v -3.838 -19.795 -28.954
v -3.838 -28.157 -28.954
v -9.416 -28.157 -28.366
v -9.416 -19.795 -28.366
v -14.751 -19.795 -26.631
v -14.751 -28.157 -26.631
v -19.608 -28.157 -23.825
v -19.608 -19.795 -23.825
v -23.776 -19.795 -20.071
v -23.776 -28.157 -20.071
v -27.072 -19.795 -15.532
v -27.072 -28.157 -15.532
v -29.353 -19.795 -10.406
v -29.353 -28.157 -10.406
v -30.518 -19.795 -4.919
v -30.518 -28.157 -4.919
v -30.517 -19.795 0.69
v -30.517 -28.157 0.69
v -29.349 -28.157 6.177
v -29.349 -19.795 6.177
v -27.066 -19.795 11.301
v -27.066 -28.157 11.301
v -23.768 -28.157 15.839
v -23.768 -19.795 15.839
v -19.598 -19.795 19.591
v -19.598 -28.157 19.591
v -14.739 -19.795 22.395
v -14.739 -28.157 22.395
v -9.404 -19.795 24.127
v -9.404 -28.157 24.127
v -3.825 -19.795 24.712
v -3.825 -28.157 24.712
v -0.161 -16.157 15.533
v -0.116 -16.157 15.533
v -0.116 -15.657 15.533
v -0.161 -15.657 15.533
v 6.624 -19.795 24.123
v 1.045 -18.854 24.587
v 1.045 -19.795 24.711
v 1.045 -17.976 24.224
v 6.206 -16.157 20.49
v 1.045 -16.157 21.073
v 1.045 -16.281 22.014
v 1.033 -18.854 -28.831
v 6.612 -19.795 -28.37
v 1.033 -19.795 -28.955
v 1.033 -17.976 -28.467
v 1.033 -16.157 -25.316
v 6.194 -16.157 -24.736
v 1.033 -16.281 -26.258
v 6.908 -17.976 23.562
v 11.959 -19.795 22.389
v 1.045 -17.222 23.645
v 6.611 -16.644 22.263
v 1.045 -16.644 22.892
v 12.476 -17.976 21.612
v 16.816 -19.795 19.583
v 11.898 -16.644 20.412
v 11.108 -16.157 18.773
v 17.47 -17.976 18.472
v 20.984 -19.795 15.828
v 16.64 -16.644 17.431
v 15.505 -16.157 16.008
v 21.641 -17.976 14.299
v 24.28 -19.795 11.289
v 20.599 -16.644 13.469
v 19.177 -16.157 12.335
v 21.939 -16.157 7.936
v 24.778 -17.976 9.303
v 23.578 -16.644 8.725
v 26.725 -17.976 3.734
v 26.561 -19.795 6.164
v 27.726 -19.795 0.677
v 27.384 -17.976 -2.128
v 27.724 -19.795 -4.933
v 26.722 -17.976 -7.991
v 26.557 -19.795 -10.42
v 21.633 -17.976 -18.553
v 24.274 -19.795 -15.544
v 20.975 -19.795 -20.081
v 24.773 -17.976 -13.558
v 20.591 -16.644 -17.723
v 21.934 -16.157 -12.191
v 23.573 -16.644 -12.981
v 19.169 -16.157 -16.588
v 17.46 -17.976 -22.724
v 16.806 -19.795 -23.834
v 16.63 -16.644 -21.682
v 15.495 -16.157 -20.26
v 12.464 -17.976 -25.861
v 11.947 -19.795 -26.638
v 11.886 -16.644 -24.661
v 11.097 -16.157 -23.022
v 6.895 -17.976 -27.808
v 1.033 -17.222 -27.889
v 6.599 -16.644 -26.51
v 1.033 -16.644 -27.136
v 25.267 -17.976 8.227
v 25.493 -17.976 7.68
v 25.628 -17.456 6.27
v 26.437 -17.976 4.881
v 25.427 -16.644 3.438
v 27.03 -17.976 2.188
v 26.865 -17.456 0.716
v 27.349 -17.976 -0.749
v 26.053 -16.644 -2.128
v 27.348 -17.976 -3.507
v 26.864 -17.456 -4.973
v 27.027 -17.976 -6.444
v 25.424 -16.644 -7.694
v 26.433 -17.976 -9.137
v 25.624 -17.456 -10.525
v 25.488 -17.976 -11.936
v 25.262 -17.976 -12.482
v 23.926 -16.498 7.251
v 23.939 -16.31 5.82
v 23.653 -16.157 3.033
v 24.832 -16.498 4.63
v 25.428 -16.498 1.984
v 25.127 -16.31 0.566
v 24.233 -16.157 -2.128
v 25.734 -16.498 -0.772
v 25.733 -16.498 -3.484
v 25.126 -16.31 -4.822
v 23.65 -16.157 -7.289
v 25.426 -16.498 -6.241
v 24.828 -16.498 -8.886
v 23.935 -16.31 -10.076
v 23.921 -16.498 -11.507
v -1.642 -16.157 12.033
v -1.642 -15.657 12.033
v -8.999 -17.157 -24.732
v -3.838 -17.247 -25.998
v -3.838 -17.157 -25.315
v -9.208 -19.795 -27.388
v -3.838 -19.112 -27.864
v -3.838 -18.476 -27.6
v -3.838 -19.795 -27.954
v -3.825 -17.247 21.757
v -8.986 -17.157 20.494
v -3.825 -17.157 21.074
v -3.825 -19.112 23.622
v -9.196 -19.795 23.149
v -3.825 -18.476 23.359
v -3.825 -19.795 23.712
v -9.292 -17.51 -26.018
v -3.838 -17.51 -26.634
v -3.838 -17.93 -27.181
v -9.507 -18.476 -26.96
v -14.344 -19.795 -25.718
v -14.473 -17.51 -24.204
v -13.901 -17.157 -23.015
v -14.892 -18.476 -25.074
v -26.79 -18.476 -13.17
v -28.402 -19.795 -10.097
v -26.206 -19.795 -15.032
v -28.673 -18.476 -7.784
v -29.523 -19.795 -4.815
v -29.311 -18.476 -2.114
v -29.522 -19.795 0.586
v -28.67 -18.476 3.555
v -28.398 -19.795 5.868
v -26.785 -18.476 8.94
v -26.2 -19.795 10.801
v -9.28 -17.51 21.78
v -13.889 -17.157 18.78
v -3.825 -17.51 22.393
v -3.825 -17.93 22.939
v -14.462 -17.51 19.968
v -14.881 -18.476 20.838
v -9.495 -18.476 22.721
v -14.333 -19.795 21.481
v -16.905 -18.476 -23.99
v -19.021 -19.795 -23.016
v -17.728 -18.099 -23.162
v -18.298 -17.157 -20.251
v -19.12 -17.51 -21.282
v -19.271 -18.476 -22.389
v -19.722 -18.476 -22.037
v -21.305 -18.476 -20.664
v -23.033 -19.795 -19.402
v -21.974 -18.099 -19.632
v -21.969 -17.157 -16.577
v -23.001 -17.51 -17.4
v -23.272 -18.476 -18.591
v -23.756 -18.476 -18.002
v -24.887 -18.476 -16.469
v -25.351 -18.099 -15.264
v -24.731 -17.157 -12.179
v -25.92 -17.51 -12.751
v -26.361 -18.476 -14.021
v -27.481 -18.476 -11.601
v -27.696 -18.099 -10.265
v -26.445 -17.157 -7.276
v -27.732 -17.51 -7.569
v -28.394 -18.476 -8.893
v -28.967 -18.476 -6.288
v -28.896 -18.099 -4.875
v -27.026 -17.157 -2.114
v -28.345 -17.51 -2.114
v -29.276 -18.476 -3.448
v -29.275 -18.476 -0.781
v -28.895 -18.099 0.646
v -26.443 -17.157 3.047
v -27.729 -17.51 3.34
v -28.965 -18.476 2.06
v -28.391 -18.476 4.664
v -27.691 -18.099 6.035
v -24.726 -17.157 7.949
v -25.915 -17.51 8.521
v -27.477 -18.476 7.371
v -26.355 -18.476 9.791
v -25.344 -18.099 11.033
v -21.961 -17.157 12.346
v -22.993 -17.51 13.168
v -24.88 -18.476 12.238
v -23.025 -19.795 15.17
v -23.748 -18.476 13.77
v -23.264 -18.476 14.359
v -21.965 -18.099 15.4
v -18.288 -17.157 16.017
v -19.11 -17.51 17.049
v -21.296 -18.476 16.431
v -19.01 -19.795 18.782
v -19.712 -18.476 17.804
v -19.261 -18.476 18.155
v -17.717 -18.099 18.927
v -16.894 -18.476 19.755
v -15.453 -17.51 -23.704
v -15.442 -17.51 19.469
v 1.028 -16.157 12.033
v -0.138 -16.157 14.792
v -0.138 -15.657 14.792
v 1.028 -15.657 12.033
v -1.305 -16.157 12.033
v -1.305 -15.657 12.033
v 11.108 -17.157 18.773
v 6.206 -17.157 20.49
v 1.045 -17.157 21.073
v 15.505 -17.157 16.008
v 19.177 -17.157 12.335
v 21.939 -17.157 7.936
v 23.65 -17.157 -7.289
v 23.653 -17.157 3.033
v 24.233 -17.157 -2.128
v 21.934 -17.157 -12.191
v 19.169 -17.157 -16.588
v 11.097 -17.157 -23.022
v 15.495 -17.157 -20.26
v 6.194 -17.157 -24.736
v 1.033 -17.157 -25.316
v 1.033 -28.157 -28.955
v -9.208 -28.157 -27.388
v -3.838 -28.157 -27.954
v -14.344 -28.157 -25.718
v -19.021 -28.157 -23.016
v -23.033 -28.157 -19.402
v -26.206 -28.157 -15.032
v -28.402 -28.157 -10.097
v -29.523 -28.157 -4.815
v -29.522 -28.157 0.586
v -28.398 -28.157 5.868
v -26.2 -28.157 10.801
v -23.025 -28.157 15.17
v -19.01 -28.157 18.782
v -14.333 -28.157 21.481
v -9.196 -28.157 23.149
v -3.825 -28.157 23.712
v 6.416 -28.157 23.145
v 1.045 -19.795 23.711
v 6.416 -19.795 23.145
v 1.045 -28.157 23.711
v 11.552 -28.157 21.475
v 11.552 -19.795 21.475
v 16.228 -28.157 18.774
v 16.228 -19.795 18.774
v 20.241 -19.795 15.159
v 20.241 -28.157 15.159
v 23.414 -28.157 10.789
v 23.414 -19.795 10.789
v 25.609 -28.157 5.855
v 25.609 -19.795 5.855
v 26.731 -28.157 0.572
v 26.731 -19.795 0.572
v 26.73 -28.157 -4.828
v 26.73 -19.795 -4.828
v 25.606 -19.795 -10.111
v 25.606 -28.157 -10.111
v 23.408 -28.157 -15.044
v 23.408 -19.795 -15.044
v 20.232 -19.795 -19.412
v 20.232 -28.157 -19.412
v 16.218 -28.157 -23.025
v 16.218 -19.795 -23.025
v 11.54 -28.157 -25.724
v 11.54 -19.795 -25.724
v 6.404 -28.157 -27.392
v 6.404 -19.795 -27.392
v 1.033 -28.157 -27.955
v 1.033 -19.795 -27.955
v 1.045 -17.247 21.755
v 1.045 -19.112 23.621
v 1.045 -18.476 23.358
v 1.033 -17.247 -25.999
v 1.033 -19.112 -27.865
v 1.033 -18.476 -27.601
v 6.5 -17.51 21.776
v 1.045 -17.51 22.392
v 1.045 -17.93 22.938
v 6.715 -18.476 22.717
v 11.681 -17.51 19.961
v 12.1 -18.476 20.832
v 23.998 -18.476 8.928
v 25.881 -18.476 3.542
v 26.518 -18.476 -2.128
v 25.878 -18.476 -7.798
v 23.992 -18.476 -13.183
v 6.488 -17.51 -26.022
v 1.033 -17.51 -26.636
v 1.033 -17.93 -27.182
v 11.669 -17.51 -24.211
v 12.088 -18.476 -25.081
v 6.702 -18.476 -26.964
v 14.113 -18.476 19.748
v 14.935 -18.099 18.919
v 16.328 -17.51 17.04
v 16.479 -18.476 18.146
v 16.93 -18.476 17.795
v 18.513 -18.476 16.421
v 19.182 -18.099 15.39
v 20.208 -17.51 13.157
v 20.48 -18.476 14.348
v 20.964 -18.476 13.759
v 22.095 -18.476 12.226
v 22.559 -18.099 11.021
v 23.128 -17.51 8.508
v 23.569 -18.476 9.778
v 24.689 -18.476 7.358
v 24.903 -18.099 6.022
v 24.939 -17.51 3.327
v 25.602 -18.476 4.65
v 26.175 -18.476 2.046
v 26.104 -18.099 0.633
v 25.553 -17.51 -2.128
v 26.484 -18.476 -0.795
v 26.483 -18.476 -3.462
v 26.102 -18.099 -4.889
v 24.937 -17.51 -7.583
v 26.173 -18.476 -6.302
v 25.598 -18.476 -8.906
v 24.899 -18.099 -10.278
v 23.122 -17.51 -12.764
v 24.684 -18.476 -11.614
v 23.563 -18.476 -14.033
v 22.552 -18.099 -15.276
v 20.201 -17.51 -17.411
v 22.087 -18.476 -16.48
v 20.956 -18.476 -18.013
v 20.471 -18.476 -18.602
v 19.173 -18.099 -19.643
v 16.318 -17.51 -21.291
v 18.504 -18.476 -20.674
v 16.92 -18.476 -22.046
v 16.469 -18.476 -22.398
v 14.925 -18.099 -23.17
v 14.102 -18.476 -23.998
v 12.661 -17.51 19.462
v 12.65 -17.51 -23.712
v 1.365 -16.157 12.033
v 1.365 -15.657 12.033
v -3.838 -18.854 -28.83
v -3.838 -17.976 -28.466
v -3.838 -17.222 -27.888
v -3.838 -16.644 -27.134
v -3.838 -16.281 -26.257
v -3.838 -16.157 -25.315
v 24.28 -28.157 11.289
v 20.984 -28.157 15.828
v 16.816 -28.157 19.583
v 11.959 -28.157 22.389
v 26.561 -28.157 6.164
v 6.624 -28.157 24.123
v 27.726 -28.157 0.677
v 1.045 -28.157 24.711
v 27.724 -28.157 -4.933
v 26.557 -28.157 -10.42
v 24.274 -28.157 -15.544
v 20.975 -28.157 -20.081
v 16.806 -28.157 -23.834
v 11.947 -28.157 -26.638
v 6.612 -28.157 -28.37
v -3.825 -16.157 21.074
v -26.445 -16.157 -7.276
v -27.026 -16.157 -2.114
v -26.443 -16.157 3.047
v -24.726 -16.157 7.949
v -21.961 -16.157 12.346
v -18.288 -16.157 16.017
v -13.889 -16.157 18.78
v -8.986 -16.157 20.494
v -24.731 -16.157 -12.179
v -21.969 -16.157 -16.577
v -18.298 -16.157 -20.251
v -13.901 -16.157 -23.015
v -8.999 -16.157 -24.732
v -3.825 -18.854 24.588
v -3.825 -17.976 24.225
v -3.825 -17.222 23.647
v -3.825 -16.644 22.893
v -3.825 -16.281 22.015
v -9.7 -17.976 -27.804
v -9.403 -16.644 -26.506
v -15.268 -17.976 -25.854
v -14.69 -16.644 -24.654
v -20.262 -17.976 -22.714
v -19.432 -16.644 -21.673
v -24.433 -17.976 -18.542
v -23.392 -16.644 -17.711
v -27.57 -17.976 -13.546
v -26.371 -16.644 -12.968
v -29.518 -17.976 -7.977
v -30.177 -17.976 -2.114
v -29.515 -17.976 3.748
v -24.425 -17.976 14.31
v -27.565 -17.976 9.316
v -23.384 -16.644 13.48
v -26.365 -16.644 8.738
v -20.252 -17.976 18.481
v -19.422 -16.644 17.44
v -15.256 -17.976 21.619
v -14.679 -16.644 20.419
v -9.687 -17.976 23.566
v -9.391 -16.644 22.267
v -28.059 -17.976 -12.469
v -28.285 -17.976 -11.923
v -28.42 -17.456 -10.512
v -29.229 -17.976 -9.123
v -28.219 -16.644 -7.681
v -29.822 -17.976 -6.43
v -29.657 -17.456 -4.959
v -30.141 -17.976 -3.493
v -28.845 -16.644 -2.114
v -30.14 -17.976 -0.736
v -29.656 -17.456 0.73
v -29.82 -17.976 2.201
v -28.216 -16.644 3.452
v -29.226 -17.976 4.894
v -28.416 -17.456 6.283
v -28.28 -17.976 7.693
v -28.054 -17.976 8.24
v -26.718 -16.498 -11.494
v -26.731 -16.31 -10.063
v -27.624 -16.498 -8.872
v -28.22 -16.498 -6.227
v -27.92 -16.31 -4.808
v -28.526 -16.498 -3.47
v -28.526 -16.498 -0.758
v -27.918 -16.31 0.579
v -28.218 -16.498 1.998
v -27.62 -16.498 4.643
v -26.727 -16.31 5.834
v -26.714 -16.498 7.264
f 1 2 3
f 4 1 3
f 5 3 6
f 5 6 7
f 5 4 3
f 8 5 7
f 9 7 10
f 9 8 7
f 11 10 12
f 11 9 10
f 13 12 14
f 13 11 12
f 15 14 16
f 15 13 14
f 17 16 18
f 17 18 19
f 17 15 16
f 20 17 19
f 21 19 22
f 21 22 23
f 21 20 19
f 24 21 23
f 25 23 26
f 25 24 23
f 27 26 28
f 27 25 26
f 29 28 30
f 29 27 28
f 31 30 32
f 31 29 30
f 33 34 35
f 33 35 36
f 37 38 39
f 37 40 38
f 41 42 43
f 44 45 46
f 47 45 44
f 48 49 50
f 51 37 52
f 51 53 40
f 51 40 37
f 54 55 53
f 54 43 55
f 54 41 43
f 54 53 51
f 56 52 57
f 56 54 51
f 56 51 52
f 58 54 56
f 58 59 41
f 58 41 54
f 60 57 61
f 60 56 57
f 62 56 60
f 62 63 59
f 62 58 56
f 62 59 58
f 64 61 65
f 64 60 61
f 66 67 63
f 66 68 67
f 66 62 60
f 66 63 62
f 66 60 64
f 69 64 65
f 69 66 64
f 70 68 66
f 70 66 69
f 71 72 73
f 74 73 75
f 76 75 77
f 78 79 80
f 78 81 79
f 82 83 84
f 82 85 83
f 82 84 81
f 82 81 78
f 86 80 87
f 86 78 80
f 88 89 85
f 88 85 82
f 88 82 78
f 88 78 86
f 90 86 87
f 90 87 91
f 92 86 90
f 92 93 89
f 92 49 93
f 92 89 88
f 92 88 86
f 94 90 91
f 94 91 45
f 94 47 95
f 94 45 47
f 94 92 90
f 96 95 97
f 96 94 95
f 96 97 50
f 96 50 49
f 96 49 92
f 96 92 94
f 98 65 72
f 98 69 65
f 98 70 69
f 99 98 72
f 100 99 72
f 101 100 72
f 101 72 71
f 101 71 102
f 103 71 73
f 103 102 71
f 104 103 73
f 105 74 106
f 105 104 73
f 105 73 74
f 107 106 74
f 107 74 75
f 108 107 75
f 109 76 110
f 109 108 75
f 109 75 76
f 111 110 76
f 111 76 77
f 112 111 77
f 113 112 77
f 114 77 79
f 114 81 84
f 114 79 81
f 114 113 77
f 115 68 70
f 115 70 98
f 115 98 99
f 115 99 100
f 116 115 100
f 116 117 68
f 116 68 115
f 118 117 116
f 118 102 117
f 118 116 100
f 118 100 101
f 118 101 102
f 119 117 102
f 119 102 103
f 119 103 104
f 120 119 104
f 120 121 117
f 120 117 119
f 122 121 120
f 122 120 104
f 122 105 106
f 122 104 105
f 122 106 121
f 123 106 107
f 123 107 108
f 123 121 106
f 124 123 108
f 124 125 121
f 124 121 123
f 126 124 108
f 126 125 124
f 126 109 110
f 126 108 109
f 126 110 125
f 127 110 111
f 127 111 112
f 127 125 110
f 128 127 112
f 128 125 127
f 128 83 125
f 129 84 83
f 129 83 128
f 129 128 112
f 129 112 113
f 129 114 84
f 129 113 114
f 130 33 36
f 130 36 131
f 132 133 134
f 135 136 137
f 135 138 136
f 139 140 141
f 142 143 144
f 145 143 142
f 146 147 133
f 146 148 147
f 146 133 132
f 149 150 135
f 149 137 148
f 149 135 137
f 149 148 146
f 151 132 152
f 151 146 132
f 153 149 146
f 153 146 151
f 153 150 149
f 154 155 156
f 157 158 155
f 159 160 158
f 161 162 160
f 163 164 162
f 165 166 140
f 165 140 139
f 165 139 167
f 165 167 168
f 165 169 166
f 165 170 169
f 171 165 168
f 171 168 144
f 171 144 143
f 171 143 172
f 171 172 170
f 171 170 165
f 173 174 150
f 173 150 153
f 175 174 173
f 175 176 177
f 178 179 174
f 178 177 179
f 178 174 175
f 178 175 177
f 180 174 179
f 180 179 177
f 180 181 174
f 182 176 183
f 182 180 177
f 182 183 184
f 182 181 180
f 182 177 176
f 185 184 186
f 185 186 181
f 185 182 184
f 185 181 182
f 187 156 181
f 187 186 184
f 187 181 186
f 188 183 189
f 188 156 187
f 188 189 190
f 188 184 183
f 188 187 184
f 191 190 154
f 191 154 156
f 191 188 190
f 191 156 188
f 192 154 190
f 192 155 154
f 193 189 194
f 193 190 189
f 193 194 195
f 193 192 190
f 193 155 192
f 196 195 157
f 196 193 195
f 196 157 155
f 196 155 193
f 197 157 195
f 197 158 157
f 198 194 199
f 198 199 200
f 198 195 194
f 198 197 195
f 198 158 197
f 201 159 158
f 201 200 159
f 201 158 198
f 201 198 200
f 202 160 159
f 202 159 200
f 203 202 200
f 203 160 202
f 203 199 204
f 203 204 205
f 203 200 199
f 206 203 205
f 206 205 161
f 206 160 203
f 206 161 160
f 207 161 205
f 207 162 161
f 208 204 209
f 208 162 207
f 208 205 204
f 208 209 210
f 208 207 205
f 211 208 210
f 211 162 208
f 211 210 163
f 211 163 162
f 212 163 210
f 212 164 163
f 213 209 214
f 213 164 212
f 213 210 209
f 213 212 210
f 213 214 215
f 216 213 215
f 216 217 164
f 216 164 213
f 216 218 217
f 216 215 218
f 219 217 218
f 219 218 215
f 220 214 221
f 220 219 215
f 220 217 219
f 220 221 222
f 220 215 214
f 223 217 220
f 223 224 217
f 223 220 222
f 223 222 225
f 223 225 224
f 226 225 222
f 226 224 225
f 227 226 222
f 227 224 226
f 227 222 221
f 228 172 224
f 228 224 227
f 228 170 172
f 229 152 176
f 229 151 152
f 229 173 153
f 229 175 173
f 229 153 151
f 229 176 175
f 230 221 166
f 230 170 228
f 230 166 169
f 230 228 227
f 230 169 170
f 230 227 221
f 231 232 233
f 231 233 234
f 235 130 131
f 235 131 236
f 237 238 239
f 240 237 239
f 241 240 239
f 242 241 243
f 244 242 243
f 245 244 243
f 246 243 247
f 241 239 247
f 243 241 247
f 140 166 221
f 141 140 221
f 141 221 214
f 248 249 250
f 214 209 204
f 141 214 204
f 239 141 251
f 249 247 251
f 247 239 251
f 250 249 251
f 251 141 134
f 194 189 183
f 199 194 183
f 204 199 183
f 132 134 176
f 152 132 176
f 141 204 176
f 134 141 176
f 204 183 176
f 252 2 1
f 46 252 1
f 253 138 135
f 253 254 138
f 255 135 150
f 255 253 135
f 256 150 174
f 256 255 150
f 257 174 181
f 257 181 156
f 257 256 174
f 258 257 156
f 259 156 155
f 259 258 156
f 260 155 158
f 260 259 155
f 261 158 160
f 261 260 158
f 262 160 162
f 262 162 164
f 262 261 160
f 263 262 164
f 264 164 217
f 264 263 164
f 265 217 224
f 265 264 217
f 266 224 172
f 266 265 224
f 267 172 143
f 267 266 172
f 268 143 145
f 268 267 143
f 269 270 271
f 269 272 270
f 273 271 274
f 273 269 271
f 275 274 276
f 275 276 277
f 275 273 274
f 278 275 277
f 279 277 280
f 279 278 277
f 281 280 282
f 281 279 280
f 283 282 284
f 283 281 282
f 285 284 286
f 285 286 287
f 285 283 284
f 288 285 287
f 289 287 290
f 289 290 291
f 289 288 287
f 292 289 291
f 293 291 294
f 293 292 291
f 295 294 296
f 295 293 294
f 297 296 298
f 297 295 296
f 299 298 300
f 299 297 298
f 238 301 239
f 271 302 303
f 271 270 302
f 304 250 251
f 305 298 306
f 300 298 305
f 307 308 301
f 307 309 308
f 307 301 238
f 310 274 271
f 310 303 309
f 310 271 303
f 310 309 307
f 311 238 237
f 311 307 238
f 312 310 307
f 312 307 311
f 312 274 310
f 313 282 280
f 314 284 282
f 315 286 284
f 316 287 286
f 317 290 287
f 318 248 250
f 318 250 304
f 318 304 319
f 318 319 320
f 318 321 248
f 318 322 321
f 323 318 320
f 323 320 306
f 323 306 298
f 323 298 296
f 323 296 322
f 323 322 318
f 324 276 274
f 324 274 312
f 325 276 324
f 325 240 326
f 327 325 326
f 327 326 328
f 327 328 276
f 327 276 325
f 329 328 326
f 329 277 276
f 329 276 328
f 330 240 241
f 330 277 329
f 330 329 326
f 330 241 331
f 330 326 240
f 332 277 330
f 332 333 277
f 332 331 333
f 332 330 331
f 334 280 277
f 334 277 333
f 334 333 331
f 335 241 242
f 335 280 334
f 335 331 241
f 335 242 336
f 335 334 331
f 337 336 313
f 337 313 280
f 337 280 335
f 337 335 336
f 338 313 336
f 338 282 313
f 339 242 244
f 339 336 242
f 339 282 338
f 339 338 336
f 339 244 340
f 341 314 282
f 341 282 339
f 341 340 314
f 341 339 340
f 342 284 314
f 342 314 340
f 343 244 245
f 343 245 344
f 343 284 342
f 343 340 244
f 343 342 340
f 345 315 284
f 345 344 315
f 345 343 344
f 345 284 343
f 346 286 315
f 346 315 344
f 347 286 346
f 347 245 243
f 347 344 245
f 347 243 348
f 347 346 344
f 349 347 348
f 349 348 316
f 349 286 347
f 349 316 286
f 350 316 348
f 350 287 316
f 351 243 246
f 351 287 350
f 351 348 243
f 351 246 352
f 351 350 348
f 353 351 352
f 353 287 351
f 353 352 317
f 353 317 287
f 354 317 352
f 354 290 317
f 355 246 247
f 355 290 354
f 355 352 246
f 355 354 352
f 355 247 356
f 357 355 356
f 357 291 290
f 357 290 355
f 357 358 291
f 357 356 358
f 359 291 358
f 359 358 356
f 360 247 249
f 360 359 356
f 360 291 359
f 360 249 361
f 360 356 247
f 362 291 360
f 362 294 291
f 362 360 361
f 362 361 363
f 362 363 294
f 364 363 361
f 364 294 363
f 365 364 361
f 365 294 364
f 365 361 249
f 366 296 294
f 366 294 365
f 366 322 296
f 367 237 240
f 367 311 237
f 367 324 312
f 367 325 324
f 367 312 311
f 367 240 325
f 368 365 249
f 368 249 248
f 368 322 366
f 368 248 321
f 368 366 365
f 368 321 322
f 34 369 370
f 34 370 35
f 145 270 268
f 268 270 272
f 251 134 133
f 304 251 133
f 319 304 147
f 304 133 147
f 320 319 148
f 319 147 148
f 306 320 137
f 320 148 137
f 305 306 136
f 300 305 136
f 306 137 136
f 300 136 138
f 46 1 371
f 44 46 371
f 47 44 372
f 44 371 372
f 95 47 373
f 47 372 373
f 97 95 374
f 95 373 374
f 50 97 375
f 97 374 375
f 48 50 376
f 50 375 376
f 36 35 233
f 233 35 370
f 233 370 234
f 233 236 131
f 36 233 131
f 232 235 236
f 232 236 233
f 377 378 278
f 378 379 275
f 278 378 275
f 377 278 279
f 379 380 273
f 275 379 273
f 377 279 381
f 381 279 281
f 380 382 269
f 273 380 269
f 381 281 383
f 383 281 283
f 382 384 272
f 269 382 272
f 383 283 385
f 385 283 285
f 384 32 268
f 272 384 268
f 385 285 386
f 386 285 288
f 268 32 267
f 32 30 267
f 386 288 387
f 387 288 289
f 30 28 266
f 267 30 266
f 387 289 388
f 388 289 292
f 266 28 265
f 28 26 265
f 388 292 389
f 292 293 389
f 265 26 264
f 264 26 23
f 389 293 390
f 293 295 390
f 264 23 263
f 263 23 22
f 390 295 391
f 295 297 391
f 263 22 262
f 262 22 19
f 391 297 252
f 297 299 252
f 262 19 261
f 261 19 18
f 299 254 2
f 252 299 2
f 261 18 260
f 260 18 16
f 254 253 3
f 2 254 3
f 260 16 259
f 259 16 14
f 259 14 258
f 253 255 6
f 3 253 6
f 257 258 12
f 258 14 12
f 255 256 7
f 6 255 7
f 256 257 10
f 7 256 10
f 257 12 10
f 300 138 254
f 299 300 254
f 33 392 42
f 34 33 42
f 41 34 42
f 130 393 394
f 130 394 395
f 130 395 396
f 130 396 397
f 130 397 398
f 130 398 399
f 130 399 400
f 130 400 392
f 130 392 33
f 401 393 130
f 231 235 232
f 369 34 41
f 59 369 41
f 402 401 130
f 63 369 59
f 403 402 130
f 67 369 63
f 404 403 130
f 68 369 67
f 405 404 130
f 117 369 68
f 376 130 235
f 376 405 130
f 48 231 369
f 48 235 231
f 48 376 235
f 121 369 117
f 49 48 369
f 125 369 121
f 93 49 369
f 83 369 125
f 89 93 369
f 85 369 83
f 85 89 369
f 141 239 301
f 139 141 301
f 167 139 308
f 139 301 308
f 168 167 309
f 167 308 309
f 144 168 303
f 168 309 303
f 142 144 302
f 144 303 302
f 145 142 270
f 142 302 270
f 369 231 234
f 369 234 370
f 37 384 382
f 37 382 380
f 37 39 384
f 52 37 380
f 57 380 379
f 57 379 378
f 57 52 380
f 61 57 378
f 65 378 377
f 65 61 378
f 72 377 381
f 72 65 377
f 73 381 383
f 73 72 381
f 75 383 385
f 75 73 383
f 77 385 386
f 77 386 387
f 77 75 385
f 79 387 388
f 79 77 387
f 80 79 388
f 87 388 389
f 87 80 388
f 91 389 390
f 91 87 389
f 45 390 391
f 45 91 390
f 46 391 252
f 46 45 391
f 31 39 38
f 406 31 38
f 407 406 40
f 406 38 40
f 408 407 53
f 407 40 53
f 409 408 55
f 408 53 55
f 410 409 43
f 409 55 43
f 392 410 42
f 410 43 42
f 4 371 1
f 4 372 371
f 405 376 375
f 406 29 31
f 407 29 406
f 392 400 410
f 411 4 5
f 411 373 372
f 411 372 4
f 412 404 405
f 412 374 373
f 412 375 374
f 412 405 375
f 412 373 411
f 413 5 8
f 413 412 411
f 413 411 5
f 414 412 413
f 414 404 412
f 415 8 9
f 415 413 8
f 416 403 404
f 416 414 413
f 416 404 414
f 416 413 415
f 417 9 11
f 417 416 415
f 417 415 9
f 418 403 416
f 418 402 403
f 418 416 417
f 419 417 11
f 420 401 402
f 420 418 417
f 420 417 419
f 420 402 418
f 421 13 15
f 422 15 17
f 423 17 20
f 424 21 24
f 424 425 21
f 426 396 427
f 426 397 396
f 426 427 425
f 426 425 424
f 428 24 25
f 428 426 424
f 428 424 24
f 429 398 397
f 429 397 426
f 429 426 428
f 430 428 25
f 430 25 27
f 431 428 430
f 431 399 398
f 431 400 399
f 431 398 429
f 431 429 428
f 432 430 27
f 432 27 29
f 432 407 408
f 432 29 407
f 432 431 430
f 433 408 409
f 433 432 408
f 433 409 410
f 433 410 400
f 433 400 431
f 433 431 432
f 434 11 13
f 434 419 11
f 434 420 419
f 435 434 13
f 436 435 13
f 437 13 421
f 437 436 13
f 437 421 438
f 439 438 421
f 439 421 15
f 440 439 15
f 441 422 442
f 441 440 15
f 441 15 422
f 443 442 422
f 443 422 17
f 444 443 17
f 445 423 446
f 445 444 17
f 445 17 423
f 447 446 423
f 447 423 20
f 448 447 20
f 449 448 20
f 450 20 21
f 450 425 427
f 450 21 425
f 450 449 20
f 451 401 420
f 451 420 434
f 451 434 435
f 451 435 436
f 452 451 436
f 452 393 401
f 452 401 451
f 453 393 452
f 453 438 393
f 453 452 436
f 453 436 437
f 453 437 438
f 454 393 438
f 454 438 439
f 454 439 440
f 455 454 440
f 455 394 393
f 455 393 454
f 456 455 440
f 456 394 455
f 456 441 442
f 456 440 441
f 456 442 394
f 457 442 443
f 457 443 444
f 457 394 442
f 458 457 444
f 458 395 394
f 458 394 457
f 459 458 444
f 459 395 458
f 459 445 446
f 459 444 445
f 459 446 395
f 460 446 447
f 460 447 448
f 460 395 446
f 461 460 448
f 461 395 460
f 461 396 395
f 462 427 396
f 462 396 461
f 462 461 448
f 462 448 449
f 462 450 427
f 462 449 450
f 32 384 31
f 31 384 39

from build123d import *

# Parameters (mm, degrees)
SKETCH3_W                = 12.333298302
SKETCH3_H                = 1
BOSS_EXTRUDE1_DEPTH      = 4
BOSS_EXTRUDE1_DEPTH_BACK = 1
BOSS_EXTRUDE2_DEPTH      = 0.5


with BuildPart() as part:
    # Sweep1: sweep along a path in Sketch1
    with BuildLine(Plane(origin=(0, -28.156757597, 0), x_dir=(1, 0, 0), z_dir=(0, 1, 0))) as sweep1_path:
        Line((1.032552653, 27.955195416), (-3.837557561, 27.953997551))
        ThreePointArc((-3.837557561, 27.953997551), (-29.664515825, 2.114331239), (-3.824849512, -23.712627024))
        Line((-3.824849512, -23.712627024), (1.045260702, -23.71142916))
        ThreePointArc((1.045260702, -23.71142916), (26.872218965, 2.128237152), (1.032552653, 27.955195416))
    # Sketch2 → Sweep1 (sweep)
    with BuildSketch(Plane(origin=(0, 0, 0), x_dir=(0, 0, -1), z_dir=(1, 0, 0))):
        with BuildLine():
            Line((27.954596483, -28.156757597), (27.954596483, -19.795322572))
            ThreePointArc((27.954596483, -19.795322572), (27.181778695, -17.929575385), (25.316031508, -17.156757597))
            Line((25.316031508, -17.156757597), (3.413395706, -17.156757597))
            Line((3.413395706, -17.156757597), (3.413395706, -16.156757597))
            Line((3.413395706, -16.156757597), (25.316031508, -16.156757597))
            ThreePointArc((25.316031508, -16.156757597), (27.888885476, -17.222468604), (28.954596483, -19.795322572))
            Line((28.954596483, -19.795322572), (28.954596483, -28.156757597))
            Line((28.954596483, -28.156757597), (27.954596483, -28.156757597))
        make_face()
    sweep(path=sweep1_path.line)

    # Sketch3 → Boss-Extrude1 (add, two sides)
    with BuildSketch(Plane(origin=(-0.000839567, 0, -3.4133955), x_dir=(0.99999997, 0, -0.000245962), z_dir=(0.000245962, 0, 0.99999997))) as boss_extrude1_sk:
        with Locations((-1.731029698, -16.656757597)):
            Rectangle(SKETCH3_W, SKETCH3_H)
    extrude(amount=BOSS_EXTRUDE1_DEPTH)
    extrude(boss_extrude1_sk.sketch, amount=-BOSS_EXTRUDE1_DEPTH_BACK)

    # Sketch4 → Boss-Extrude2 (add)
    with BuildSketch(Plane(origin=(0, -16.156757597, 0), x_dir=(1, 0, 0), z_dir=(0, 1, 0))):
        Polygon((-1.641529651, -12.033441663), (-1.30499119, -12.033441663), (-0.138324523, -14.791654805), (1.028342144, -12.033441663), (1.364880605, -12.033441663), (-0.115888626, -15.533441663), (-0.160760421, -15.533441663), align=None)
    extrude(amount=BOSS_EXTRUDE2_DEPTH)


solid = part.part
